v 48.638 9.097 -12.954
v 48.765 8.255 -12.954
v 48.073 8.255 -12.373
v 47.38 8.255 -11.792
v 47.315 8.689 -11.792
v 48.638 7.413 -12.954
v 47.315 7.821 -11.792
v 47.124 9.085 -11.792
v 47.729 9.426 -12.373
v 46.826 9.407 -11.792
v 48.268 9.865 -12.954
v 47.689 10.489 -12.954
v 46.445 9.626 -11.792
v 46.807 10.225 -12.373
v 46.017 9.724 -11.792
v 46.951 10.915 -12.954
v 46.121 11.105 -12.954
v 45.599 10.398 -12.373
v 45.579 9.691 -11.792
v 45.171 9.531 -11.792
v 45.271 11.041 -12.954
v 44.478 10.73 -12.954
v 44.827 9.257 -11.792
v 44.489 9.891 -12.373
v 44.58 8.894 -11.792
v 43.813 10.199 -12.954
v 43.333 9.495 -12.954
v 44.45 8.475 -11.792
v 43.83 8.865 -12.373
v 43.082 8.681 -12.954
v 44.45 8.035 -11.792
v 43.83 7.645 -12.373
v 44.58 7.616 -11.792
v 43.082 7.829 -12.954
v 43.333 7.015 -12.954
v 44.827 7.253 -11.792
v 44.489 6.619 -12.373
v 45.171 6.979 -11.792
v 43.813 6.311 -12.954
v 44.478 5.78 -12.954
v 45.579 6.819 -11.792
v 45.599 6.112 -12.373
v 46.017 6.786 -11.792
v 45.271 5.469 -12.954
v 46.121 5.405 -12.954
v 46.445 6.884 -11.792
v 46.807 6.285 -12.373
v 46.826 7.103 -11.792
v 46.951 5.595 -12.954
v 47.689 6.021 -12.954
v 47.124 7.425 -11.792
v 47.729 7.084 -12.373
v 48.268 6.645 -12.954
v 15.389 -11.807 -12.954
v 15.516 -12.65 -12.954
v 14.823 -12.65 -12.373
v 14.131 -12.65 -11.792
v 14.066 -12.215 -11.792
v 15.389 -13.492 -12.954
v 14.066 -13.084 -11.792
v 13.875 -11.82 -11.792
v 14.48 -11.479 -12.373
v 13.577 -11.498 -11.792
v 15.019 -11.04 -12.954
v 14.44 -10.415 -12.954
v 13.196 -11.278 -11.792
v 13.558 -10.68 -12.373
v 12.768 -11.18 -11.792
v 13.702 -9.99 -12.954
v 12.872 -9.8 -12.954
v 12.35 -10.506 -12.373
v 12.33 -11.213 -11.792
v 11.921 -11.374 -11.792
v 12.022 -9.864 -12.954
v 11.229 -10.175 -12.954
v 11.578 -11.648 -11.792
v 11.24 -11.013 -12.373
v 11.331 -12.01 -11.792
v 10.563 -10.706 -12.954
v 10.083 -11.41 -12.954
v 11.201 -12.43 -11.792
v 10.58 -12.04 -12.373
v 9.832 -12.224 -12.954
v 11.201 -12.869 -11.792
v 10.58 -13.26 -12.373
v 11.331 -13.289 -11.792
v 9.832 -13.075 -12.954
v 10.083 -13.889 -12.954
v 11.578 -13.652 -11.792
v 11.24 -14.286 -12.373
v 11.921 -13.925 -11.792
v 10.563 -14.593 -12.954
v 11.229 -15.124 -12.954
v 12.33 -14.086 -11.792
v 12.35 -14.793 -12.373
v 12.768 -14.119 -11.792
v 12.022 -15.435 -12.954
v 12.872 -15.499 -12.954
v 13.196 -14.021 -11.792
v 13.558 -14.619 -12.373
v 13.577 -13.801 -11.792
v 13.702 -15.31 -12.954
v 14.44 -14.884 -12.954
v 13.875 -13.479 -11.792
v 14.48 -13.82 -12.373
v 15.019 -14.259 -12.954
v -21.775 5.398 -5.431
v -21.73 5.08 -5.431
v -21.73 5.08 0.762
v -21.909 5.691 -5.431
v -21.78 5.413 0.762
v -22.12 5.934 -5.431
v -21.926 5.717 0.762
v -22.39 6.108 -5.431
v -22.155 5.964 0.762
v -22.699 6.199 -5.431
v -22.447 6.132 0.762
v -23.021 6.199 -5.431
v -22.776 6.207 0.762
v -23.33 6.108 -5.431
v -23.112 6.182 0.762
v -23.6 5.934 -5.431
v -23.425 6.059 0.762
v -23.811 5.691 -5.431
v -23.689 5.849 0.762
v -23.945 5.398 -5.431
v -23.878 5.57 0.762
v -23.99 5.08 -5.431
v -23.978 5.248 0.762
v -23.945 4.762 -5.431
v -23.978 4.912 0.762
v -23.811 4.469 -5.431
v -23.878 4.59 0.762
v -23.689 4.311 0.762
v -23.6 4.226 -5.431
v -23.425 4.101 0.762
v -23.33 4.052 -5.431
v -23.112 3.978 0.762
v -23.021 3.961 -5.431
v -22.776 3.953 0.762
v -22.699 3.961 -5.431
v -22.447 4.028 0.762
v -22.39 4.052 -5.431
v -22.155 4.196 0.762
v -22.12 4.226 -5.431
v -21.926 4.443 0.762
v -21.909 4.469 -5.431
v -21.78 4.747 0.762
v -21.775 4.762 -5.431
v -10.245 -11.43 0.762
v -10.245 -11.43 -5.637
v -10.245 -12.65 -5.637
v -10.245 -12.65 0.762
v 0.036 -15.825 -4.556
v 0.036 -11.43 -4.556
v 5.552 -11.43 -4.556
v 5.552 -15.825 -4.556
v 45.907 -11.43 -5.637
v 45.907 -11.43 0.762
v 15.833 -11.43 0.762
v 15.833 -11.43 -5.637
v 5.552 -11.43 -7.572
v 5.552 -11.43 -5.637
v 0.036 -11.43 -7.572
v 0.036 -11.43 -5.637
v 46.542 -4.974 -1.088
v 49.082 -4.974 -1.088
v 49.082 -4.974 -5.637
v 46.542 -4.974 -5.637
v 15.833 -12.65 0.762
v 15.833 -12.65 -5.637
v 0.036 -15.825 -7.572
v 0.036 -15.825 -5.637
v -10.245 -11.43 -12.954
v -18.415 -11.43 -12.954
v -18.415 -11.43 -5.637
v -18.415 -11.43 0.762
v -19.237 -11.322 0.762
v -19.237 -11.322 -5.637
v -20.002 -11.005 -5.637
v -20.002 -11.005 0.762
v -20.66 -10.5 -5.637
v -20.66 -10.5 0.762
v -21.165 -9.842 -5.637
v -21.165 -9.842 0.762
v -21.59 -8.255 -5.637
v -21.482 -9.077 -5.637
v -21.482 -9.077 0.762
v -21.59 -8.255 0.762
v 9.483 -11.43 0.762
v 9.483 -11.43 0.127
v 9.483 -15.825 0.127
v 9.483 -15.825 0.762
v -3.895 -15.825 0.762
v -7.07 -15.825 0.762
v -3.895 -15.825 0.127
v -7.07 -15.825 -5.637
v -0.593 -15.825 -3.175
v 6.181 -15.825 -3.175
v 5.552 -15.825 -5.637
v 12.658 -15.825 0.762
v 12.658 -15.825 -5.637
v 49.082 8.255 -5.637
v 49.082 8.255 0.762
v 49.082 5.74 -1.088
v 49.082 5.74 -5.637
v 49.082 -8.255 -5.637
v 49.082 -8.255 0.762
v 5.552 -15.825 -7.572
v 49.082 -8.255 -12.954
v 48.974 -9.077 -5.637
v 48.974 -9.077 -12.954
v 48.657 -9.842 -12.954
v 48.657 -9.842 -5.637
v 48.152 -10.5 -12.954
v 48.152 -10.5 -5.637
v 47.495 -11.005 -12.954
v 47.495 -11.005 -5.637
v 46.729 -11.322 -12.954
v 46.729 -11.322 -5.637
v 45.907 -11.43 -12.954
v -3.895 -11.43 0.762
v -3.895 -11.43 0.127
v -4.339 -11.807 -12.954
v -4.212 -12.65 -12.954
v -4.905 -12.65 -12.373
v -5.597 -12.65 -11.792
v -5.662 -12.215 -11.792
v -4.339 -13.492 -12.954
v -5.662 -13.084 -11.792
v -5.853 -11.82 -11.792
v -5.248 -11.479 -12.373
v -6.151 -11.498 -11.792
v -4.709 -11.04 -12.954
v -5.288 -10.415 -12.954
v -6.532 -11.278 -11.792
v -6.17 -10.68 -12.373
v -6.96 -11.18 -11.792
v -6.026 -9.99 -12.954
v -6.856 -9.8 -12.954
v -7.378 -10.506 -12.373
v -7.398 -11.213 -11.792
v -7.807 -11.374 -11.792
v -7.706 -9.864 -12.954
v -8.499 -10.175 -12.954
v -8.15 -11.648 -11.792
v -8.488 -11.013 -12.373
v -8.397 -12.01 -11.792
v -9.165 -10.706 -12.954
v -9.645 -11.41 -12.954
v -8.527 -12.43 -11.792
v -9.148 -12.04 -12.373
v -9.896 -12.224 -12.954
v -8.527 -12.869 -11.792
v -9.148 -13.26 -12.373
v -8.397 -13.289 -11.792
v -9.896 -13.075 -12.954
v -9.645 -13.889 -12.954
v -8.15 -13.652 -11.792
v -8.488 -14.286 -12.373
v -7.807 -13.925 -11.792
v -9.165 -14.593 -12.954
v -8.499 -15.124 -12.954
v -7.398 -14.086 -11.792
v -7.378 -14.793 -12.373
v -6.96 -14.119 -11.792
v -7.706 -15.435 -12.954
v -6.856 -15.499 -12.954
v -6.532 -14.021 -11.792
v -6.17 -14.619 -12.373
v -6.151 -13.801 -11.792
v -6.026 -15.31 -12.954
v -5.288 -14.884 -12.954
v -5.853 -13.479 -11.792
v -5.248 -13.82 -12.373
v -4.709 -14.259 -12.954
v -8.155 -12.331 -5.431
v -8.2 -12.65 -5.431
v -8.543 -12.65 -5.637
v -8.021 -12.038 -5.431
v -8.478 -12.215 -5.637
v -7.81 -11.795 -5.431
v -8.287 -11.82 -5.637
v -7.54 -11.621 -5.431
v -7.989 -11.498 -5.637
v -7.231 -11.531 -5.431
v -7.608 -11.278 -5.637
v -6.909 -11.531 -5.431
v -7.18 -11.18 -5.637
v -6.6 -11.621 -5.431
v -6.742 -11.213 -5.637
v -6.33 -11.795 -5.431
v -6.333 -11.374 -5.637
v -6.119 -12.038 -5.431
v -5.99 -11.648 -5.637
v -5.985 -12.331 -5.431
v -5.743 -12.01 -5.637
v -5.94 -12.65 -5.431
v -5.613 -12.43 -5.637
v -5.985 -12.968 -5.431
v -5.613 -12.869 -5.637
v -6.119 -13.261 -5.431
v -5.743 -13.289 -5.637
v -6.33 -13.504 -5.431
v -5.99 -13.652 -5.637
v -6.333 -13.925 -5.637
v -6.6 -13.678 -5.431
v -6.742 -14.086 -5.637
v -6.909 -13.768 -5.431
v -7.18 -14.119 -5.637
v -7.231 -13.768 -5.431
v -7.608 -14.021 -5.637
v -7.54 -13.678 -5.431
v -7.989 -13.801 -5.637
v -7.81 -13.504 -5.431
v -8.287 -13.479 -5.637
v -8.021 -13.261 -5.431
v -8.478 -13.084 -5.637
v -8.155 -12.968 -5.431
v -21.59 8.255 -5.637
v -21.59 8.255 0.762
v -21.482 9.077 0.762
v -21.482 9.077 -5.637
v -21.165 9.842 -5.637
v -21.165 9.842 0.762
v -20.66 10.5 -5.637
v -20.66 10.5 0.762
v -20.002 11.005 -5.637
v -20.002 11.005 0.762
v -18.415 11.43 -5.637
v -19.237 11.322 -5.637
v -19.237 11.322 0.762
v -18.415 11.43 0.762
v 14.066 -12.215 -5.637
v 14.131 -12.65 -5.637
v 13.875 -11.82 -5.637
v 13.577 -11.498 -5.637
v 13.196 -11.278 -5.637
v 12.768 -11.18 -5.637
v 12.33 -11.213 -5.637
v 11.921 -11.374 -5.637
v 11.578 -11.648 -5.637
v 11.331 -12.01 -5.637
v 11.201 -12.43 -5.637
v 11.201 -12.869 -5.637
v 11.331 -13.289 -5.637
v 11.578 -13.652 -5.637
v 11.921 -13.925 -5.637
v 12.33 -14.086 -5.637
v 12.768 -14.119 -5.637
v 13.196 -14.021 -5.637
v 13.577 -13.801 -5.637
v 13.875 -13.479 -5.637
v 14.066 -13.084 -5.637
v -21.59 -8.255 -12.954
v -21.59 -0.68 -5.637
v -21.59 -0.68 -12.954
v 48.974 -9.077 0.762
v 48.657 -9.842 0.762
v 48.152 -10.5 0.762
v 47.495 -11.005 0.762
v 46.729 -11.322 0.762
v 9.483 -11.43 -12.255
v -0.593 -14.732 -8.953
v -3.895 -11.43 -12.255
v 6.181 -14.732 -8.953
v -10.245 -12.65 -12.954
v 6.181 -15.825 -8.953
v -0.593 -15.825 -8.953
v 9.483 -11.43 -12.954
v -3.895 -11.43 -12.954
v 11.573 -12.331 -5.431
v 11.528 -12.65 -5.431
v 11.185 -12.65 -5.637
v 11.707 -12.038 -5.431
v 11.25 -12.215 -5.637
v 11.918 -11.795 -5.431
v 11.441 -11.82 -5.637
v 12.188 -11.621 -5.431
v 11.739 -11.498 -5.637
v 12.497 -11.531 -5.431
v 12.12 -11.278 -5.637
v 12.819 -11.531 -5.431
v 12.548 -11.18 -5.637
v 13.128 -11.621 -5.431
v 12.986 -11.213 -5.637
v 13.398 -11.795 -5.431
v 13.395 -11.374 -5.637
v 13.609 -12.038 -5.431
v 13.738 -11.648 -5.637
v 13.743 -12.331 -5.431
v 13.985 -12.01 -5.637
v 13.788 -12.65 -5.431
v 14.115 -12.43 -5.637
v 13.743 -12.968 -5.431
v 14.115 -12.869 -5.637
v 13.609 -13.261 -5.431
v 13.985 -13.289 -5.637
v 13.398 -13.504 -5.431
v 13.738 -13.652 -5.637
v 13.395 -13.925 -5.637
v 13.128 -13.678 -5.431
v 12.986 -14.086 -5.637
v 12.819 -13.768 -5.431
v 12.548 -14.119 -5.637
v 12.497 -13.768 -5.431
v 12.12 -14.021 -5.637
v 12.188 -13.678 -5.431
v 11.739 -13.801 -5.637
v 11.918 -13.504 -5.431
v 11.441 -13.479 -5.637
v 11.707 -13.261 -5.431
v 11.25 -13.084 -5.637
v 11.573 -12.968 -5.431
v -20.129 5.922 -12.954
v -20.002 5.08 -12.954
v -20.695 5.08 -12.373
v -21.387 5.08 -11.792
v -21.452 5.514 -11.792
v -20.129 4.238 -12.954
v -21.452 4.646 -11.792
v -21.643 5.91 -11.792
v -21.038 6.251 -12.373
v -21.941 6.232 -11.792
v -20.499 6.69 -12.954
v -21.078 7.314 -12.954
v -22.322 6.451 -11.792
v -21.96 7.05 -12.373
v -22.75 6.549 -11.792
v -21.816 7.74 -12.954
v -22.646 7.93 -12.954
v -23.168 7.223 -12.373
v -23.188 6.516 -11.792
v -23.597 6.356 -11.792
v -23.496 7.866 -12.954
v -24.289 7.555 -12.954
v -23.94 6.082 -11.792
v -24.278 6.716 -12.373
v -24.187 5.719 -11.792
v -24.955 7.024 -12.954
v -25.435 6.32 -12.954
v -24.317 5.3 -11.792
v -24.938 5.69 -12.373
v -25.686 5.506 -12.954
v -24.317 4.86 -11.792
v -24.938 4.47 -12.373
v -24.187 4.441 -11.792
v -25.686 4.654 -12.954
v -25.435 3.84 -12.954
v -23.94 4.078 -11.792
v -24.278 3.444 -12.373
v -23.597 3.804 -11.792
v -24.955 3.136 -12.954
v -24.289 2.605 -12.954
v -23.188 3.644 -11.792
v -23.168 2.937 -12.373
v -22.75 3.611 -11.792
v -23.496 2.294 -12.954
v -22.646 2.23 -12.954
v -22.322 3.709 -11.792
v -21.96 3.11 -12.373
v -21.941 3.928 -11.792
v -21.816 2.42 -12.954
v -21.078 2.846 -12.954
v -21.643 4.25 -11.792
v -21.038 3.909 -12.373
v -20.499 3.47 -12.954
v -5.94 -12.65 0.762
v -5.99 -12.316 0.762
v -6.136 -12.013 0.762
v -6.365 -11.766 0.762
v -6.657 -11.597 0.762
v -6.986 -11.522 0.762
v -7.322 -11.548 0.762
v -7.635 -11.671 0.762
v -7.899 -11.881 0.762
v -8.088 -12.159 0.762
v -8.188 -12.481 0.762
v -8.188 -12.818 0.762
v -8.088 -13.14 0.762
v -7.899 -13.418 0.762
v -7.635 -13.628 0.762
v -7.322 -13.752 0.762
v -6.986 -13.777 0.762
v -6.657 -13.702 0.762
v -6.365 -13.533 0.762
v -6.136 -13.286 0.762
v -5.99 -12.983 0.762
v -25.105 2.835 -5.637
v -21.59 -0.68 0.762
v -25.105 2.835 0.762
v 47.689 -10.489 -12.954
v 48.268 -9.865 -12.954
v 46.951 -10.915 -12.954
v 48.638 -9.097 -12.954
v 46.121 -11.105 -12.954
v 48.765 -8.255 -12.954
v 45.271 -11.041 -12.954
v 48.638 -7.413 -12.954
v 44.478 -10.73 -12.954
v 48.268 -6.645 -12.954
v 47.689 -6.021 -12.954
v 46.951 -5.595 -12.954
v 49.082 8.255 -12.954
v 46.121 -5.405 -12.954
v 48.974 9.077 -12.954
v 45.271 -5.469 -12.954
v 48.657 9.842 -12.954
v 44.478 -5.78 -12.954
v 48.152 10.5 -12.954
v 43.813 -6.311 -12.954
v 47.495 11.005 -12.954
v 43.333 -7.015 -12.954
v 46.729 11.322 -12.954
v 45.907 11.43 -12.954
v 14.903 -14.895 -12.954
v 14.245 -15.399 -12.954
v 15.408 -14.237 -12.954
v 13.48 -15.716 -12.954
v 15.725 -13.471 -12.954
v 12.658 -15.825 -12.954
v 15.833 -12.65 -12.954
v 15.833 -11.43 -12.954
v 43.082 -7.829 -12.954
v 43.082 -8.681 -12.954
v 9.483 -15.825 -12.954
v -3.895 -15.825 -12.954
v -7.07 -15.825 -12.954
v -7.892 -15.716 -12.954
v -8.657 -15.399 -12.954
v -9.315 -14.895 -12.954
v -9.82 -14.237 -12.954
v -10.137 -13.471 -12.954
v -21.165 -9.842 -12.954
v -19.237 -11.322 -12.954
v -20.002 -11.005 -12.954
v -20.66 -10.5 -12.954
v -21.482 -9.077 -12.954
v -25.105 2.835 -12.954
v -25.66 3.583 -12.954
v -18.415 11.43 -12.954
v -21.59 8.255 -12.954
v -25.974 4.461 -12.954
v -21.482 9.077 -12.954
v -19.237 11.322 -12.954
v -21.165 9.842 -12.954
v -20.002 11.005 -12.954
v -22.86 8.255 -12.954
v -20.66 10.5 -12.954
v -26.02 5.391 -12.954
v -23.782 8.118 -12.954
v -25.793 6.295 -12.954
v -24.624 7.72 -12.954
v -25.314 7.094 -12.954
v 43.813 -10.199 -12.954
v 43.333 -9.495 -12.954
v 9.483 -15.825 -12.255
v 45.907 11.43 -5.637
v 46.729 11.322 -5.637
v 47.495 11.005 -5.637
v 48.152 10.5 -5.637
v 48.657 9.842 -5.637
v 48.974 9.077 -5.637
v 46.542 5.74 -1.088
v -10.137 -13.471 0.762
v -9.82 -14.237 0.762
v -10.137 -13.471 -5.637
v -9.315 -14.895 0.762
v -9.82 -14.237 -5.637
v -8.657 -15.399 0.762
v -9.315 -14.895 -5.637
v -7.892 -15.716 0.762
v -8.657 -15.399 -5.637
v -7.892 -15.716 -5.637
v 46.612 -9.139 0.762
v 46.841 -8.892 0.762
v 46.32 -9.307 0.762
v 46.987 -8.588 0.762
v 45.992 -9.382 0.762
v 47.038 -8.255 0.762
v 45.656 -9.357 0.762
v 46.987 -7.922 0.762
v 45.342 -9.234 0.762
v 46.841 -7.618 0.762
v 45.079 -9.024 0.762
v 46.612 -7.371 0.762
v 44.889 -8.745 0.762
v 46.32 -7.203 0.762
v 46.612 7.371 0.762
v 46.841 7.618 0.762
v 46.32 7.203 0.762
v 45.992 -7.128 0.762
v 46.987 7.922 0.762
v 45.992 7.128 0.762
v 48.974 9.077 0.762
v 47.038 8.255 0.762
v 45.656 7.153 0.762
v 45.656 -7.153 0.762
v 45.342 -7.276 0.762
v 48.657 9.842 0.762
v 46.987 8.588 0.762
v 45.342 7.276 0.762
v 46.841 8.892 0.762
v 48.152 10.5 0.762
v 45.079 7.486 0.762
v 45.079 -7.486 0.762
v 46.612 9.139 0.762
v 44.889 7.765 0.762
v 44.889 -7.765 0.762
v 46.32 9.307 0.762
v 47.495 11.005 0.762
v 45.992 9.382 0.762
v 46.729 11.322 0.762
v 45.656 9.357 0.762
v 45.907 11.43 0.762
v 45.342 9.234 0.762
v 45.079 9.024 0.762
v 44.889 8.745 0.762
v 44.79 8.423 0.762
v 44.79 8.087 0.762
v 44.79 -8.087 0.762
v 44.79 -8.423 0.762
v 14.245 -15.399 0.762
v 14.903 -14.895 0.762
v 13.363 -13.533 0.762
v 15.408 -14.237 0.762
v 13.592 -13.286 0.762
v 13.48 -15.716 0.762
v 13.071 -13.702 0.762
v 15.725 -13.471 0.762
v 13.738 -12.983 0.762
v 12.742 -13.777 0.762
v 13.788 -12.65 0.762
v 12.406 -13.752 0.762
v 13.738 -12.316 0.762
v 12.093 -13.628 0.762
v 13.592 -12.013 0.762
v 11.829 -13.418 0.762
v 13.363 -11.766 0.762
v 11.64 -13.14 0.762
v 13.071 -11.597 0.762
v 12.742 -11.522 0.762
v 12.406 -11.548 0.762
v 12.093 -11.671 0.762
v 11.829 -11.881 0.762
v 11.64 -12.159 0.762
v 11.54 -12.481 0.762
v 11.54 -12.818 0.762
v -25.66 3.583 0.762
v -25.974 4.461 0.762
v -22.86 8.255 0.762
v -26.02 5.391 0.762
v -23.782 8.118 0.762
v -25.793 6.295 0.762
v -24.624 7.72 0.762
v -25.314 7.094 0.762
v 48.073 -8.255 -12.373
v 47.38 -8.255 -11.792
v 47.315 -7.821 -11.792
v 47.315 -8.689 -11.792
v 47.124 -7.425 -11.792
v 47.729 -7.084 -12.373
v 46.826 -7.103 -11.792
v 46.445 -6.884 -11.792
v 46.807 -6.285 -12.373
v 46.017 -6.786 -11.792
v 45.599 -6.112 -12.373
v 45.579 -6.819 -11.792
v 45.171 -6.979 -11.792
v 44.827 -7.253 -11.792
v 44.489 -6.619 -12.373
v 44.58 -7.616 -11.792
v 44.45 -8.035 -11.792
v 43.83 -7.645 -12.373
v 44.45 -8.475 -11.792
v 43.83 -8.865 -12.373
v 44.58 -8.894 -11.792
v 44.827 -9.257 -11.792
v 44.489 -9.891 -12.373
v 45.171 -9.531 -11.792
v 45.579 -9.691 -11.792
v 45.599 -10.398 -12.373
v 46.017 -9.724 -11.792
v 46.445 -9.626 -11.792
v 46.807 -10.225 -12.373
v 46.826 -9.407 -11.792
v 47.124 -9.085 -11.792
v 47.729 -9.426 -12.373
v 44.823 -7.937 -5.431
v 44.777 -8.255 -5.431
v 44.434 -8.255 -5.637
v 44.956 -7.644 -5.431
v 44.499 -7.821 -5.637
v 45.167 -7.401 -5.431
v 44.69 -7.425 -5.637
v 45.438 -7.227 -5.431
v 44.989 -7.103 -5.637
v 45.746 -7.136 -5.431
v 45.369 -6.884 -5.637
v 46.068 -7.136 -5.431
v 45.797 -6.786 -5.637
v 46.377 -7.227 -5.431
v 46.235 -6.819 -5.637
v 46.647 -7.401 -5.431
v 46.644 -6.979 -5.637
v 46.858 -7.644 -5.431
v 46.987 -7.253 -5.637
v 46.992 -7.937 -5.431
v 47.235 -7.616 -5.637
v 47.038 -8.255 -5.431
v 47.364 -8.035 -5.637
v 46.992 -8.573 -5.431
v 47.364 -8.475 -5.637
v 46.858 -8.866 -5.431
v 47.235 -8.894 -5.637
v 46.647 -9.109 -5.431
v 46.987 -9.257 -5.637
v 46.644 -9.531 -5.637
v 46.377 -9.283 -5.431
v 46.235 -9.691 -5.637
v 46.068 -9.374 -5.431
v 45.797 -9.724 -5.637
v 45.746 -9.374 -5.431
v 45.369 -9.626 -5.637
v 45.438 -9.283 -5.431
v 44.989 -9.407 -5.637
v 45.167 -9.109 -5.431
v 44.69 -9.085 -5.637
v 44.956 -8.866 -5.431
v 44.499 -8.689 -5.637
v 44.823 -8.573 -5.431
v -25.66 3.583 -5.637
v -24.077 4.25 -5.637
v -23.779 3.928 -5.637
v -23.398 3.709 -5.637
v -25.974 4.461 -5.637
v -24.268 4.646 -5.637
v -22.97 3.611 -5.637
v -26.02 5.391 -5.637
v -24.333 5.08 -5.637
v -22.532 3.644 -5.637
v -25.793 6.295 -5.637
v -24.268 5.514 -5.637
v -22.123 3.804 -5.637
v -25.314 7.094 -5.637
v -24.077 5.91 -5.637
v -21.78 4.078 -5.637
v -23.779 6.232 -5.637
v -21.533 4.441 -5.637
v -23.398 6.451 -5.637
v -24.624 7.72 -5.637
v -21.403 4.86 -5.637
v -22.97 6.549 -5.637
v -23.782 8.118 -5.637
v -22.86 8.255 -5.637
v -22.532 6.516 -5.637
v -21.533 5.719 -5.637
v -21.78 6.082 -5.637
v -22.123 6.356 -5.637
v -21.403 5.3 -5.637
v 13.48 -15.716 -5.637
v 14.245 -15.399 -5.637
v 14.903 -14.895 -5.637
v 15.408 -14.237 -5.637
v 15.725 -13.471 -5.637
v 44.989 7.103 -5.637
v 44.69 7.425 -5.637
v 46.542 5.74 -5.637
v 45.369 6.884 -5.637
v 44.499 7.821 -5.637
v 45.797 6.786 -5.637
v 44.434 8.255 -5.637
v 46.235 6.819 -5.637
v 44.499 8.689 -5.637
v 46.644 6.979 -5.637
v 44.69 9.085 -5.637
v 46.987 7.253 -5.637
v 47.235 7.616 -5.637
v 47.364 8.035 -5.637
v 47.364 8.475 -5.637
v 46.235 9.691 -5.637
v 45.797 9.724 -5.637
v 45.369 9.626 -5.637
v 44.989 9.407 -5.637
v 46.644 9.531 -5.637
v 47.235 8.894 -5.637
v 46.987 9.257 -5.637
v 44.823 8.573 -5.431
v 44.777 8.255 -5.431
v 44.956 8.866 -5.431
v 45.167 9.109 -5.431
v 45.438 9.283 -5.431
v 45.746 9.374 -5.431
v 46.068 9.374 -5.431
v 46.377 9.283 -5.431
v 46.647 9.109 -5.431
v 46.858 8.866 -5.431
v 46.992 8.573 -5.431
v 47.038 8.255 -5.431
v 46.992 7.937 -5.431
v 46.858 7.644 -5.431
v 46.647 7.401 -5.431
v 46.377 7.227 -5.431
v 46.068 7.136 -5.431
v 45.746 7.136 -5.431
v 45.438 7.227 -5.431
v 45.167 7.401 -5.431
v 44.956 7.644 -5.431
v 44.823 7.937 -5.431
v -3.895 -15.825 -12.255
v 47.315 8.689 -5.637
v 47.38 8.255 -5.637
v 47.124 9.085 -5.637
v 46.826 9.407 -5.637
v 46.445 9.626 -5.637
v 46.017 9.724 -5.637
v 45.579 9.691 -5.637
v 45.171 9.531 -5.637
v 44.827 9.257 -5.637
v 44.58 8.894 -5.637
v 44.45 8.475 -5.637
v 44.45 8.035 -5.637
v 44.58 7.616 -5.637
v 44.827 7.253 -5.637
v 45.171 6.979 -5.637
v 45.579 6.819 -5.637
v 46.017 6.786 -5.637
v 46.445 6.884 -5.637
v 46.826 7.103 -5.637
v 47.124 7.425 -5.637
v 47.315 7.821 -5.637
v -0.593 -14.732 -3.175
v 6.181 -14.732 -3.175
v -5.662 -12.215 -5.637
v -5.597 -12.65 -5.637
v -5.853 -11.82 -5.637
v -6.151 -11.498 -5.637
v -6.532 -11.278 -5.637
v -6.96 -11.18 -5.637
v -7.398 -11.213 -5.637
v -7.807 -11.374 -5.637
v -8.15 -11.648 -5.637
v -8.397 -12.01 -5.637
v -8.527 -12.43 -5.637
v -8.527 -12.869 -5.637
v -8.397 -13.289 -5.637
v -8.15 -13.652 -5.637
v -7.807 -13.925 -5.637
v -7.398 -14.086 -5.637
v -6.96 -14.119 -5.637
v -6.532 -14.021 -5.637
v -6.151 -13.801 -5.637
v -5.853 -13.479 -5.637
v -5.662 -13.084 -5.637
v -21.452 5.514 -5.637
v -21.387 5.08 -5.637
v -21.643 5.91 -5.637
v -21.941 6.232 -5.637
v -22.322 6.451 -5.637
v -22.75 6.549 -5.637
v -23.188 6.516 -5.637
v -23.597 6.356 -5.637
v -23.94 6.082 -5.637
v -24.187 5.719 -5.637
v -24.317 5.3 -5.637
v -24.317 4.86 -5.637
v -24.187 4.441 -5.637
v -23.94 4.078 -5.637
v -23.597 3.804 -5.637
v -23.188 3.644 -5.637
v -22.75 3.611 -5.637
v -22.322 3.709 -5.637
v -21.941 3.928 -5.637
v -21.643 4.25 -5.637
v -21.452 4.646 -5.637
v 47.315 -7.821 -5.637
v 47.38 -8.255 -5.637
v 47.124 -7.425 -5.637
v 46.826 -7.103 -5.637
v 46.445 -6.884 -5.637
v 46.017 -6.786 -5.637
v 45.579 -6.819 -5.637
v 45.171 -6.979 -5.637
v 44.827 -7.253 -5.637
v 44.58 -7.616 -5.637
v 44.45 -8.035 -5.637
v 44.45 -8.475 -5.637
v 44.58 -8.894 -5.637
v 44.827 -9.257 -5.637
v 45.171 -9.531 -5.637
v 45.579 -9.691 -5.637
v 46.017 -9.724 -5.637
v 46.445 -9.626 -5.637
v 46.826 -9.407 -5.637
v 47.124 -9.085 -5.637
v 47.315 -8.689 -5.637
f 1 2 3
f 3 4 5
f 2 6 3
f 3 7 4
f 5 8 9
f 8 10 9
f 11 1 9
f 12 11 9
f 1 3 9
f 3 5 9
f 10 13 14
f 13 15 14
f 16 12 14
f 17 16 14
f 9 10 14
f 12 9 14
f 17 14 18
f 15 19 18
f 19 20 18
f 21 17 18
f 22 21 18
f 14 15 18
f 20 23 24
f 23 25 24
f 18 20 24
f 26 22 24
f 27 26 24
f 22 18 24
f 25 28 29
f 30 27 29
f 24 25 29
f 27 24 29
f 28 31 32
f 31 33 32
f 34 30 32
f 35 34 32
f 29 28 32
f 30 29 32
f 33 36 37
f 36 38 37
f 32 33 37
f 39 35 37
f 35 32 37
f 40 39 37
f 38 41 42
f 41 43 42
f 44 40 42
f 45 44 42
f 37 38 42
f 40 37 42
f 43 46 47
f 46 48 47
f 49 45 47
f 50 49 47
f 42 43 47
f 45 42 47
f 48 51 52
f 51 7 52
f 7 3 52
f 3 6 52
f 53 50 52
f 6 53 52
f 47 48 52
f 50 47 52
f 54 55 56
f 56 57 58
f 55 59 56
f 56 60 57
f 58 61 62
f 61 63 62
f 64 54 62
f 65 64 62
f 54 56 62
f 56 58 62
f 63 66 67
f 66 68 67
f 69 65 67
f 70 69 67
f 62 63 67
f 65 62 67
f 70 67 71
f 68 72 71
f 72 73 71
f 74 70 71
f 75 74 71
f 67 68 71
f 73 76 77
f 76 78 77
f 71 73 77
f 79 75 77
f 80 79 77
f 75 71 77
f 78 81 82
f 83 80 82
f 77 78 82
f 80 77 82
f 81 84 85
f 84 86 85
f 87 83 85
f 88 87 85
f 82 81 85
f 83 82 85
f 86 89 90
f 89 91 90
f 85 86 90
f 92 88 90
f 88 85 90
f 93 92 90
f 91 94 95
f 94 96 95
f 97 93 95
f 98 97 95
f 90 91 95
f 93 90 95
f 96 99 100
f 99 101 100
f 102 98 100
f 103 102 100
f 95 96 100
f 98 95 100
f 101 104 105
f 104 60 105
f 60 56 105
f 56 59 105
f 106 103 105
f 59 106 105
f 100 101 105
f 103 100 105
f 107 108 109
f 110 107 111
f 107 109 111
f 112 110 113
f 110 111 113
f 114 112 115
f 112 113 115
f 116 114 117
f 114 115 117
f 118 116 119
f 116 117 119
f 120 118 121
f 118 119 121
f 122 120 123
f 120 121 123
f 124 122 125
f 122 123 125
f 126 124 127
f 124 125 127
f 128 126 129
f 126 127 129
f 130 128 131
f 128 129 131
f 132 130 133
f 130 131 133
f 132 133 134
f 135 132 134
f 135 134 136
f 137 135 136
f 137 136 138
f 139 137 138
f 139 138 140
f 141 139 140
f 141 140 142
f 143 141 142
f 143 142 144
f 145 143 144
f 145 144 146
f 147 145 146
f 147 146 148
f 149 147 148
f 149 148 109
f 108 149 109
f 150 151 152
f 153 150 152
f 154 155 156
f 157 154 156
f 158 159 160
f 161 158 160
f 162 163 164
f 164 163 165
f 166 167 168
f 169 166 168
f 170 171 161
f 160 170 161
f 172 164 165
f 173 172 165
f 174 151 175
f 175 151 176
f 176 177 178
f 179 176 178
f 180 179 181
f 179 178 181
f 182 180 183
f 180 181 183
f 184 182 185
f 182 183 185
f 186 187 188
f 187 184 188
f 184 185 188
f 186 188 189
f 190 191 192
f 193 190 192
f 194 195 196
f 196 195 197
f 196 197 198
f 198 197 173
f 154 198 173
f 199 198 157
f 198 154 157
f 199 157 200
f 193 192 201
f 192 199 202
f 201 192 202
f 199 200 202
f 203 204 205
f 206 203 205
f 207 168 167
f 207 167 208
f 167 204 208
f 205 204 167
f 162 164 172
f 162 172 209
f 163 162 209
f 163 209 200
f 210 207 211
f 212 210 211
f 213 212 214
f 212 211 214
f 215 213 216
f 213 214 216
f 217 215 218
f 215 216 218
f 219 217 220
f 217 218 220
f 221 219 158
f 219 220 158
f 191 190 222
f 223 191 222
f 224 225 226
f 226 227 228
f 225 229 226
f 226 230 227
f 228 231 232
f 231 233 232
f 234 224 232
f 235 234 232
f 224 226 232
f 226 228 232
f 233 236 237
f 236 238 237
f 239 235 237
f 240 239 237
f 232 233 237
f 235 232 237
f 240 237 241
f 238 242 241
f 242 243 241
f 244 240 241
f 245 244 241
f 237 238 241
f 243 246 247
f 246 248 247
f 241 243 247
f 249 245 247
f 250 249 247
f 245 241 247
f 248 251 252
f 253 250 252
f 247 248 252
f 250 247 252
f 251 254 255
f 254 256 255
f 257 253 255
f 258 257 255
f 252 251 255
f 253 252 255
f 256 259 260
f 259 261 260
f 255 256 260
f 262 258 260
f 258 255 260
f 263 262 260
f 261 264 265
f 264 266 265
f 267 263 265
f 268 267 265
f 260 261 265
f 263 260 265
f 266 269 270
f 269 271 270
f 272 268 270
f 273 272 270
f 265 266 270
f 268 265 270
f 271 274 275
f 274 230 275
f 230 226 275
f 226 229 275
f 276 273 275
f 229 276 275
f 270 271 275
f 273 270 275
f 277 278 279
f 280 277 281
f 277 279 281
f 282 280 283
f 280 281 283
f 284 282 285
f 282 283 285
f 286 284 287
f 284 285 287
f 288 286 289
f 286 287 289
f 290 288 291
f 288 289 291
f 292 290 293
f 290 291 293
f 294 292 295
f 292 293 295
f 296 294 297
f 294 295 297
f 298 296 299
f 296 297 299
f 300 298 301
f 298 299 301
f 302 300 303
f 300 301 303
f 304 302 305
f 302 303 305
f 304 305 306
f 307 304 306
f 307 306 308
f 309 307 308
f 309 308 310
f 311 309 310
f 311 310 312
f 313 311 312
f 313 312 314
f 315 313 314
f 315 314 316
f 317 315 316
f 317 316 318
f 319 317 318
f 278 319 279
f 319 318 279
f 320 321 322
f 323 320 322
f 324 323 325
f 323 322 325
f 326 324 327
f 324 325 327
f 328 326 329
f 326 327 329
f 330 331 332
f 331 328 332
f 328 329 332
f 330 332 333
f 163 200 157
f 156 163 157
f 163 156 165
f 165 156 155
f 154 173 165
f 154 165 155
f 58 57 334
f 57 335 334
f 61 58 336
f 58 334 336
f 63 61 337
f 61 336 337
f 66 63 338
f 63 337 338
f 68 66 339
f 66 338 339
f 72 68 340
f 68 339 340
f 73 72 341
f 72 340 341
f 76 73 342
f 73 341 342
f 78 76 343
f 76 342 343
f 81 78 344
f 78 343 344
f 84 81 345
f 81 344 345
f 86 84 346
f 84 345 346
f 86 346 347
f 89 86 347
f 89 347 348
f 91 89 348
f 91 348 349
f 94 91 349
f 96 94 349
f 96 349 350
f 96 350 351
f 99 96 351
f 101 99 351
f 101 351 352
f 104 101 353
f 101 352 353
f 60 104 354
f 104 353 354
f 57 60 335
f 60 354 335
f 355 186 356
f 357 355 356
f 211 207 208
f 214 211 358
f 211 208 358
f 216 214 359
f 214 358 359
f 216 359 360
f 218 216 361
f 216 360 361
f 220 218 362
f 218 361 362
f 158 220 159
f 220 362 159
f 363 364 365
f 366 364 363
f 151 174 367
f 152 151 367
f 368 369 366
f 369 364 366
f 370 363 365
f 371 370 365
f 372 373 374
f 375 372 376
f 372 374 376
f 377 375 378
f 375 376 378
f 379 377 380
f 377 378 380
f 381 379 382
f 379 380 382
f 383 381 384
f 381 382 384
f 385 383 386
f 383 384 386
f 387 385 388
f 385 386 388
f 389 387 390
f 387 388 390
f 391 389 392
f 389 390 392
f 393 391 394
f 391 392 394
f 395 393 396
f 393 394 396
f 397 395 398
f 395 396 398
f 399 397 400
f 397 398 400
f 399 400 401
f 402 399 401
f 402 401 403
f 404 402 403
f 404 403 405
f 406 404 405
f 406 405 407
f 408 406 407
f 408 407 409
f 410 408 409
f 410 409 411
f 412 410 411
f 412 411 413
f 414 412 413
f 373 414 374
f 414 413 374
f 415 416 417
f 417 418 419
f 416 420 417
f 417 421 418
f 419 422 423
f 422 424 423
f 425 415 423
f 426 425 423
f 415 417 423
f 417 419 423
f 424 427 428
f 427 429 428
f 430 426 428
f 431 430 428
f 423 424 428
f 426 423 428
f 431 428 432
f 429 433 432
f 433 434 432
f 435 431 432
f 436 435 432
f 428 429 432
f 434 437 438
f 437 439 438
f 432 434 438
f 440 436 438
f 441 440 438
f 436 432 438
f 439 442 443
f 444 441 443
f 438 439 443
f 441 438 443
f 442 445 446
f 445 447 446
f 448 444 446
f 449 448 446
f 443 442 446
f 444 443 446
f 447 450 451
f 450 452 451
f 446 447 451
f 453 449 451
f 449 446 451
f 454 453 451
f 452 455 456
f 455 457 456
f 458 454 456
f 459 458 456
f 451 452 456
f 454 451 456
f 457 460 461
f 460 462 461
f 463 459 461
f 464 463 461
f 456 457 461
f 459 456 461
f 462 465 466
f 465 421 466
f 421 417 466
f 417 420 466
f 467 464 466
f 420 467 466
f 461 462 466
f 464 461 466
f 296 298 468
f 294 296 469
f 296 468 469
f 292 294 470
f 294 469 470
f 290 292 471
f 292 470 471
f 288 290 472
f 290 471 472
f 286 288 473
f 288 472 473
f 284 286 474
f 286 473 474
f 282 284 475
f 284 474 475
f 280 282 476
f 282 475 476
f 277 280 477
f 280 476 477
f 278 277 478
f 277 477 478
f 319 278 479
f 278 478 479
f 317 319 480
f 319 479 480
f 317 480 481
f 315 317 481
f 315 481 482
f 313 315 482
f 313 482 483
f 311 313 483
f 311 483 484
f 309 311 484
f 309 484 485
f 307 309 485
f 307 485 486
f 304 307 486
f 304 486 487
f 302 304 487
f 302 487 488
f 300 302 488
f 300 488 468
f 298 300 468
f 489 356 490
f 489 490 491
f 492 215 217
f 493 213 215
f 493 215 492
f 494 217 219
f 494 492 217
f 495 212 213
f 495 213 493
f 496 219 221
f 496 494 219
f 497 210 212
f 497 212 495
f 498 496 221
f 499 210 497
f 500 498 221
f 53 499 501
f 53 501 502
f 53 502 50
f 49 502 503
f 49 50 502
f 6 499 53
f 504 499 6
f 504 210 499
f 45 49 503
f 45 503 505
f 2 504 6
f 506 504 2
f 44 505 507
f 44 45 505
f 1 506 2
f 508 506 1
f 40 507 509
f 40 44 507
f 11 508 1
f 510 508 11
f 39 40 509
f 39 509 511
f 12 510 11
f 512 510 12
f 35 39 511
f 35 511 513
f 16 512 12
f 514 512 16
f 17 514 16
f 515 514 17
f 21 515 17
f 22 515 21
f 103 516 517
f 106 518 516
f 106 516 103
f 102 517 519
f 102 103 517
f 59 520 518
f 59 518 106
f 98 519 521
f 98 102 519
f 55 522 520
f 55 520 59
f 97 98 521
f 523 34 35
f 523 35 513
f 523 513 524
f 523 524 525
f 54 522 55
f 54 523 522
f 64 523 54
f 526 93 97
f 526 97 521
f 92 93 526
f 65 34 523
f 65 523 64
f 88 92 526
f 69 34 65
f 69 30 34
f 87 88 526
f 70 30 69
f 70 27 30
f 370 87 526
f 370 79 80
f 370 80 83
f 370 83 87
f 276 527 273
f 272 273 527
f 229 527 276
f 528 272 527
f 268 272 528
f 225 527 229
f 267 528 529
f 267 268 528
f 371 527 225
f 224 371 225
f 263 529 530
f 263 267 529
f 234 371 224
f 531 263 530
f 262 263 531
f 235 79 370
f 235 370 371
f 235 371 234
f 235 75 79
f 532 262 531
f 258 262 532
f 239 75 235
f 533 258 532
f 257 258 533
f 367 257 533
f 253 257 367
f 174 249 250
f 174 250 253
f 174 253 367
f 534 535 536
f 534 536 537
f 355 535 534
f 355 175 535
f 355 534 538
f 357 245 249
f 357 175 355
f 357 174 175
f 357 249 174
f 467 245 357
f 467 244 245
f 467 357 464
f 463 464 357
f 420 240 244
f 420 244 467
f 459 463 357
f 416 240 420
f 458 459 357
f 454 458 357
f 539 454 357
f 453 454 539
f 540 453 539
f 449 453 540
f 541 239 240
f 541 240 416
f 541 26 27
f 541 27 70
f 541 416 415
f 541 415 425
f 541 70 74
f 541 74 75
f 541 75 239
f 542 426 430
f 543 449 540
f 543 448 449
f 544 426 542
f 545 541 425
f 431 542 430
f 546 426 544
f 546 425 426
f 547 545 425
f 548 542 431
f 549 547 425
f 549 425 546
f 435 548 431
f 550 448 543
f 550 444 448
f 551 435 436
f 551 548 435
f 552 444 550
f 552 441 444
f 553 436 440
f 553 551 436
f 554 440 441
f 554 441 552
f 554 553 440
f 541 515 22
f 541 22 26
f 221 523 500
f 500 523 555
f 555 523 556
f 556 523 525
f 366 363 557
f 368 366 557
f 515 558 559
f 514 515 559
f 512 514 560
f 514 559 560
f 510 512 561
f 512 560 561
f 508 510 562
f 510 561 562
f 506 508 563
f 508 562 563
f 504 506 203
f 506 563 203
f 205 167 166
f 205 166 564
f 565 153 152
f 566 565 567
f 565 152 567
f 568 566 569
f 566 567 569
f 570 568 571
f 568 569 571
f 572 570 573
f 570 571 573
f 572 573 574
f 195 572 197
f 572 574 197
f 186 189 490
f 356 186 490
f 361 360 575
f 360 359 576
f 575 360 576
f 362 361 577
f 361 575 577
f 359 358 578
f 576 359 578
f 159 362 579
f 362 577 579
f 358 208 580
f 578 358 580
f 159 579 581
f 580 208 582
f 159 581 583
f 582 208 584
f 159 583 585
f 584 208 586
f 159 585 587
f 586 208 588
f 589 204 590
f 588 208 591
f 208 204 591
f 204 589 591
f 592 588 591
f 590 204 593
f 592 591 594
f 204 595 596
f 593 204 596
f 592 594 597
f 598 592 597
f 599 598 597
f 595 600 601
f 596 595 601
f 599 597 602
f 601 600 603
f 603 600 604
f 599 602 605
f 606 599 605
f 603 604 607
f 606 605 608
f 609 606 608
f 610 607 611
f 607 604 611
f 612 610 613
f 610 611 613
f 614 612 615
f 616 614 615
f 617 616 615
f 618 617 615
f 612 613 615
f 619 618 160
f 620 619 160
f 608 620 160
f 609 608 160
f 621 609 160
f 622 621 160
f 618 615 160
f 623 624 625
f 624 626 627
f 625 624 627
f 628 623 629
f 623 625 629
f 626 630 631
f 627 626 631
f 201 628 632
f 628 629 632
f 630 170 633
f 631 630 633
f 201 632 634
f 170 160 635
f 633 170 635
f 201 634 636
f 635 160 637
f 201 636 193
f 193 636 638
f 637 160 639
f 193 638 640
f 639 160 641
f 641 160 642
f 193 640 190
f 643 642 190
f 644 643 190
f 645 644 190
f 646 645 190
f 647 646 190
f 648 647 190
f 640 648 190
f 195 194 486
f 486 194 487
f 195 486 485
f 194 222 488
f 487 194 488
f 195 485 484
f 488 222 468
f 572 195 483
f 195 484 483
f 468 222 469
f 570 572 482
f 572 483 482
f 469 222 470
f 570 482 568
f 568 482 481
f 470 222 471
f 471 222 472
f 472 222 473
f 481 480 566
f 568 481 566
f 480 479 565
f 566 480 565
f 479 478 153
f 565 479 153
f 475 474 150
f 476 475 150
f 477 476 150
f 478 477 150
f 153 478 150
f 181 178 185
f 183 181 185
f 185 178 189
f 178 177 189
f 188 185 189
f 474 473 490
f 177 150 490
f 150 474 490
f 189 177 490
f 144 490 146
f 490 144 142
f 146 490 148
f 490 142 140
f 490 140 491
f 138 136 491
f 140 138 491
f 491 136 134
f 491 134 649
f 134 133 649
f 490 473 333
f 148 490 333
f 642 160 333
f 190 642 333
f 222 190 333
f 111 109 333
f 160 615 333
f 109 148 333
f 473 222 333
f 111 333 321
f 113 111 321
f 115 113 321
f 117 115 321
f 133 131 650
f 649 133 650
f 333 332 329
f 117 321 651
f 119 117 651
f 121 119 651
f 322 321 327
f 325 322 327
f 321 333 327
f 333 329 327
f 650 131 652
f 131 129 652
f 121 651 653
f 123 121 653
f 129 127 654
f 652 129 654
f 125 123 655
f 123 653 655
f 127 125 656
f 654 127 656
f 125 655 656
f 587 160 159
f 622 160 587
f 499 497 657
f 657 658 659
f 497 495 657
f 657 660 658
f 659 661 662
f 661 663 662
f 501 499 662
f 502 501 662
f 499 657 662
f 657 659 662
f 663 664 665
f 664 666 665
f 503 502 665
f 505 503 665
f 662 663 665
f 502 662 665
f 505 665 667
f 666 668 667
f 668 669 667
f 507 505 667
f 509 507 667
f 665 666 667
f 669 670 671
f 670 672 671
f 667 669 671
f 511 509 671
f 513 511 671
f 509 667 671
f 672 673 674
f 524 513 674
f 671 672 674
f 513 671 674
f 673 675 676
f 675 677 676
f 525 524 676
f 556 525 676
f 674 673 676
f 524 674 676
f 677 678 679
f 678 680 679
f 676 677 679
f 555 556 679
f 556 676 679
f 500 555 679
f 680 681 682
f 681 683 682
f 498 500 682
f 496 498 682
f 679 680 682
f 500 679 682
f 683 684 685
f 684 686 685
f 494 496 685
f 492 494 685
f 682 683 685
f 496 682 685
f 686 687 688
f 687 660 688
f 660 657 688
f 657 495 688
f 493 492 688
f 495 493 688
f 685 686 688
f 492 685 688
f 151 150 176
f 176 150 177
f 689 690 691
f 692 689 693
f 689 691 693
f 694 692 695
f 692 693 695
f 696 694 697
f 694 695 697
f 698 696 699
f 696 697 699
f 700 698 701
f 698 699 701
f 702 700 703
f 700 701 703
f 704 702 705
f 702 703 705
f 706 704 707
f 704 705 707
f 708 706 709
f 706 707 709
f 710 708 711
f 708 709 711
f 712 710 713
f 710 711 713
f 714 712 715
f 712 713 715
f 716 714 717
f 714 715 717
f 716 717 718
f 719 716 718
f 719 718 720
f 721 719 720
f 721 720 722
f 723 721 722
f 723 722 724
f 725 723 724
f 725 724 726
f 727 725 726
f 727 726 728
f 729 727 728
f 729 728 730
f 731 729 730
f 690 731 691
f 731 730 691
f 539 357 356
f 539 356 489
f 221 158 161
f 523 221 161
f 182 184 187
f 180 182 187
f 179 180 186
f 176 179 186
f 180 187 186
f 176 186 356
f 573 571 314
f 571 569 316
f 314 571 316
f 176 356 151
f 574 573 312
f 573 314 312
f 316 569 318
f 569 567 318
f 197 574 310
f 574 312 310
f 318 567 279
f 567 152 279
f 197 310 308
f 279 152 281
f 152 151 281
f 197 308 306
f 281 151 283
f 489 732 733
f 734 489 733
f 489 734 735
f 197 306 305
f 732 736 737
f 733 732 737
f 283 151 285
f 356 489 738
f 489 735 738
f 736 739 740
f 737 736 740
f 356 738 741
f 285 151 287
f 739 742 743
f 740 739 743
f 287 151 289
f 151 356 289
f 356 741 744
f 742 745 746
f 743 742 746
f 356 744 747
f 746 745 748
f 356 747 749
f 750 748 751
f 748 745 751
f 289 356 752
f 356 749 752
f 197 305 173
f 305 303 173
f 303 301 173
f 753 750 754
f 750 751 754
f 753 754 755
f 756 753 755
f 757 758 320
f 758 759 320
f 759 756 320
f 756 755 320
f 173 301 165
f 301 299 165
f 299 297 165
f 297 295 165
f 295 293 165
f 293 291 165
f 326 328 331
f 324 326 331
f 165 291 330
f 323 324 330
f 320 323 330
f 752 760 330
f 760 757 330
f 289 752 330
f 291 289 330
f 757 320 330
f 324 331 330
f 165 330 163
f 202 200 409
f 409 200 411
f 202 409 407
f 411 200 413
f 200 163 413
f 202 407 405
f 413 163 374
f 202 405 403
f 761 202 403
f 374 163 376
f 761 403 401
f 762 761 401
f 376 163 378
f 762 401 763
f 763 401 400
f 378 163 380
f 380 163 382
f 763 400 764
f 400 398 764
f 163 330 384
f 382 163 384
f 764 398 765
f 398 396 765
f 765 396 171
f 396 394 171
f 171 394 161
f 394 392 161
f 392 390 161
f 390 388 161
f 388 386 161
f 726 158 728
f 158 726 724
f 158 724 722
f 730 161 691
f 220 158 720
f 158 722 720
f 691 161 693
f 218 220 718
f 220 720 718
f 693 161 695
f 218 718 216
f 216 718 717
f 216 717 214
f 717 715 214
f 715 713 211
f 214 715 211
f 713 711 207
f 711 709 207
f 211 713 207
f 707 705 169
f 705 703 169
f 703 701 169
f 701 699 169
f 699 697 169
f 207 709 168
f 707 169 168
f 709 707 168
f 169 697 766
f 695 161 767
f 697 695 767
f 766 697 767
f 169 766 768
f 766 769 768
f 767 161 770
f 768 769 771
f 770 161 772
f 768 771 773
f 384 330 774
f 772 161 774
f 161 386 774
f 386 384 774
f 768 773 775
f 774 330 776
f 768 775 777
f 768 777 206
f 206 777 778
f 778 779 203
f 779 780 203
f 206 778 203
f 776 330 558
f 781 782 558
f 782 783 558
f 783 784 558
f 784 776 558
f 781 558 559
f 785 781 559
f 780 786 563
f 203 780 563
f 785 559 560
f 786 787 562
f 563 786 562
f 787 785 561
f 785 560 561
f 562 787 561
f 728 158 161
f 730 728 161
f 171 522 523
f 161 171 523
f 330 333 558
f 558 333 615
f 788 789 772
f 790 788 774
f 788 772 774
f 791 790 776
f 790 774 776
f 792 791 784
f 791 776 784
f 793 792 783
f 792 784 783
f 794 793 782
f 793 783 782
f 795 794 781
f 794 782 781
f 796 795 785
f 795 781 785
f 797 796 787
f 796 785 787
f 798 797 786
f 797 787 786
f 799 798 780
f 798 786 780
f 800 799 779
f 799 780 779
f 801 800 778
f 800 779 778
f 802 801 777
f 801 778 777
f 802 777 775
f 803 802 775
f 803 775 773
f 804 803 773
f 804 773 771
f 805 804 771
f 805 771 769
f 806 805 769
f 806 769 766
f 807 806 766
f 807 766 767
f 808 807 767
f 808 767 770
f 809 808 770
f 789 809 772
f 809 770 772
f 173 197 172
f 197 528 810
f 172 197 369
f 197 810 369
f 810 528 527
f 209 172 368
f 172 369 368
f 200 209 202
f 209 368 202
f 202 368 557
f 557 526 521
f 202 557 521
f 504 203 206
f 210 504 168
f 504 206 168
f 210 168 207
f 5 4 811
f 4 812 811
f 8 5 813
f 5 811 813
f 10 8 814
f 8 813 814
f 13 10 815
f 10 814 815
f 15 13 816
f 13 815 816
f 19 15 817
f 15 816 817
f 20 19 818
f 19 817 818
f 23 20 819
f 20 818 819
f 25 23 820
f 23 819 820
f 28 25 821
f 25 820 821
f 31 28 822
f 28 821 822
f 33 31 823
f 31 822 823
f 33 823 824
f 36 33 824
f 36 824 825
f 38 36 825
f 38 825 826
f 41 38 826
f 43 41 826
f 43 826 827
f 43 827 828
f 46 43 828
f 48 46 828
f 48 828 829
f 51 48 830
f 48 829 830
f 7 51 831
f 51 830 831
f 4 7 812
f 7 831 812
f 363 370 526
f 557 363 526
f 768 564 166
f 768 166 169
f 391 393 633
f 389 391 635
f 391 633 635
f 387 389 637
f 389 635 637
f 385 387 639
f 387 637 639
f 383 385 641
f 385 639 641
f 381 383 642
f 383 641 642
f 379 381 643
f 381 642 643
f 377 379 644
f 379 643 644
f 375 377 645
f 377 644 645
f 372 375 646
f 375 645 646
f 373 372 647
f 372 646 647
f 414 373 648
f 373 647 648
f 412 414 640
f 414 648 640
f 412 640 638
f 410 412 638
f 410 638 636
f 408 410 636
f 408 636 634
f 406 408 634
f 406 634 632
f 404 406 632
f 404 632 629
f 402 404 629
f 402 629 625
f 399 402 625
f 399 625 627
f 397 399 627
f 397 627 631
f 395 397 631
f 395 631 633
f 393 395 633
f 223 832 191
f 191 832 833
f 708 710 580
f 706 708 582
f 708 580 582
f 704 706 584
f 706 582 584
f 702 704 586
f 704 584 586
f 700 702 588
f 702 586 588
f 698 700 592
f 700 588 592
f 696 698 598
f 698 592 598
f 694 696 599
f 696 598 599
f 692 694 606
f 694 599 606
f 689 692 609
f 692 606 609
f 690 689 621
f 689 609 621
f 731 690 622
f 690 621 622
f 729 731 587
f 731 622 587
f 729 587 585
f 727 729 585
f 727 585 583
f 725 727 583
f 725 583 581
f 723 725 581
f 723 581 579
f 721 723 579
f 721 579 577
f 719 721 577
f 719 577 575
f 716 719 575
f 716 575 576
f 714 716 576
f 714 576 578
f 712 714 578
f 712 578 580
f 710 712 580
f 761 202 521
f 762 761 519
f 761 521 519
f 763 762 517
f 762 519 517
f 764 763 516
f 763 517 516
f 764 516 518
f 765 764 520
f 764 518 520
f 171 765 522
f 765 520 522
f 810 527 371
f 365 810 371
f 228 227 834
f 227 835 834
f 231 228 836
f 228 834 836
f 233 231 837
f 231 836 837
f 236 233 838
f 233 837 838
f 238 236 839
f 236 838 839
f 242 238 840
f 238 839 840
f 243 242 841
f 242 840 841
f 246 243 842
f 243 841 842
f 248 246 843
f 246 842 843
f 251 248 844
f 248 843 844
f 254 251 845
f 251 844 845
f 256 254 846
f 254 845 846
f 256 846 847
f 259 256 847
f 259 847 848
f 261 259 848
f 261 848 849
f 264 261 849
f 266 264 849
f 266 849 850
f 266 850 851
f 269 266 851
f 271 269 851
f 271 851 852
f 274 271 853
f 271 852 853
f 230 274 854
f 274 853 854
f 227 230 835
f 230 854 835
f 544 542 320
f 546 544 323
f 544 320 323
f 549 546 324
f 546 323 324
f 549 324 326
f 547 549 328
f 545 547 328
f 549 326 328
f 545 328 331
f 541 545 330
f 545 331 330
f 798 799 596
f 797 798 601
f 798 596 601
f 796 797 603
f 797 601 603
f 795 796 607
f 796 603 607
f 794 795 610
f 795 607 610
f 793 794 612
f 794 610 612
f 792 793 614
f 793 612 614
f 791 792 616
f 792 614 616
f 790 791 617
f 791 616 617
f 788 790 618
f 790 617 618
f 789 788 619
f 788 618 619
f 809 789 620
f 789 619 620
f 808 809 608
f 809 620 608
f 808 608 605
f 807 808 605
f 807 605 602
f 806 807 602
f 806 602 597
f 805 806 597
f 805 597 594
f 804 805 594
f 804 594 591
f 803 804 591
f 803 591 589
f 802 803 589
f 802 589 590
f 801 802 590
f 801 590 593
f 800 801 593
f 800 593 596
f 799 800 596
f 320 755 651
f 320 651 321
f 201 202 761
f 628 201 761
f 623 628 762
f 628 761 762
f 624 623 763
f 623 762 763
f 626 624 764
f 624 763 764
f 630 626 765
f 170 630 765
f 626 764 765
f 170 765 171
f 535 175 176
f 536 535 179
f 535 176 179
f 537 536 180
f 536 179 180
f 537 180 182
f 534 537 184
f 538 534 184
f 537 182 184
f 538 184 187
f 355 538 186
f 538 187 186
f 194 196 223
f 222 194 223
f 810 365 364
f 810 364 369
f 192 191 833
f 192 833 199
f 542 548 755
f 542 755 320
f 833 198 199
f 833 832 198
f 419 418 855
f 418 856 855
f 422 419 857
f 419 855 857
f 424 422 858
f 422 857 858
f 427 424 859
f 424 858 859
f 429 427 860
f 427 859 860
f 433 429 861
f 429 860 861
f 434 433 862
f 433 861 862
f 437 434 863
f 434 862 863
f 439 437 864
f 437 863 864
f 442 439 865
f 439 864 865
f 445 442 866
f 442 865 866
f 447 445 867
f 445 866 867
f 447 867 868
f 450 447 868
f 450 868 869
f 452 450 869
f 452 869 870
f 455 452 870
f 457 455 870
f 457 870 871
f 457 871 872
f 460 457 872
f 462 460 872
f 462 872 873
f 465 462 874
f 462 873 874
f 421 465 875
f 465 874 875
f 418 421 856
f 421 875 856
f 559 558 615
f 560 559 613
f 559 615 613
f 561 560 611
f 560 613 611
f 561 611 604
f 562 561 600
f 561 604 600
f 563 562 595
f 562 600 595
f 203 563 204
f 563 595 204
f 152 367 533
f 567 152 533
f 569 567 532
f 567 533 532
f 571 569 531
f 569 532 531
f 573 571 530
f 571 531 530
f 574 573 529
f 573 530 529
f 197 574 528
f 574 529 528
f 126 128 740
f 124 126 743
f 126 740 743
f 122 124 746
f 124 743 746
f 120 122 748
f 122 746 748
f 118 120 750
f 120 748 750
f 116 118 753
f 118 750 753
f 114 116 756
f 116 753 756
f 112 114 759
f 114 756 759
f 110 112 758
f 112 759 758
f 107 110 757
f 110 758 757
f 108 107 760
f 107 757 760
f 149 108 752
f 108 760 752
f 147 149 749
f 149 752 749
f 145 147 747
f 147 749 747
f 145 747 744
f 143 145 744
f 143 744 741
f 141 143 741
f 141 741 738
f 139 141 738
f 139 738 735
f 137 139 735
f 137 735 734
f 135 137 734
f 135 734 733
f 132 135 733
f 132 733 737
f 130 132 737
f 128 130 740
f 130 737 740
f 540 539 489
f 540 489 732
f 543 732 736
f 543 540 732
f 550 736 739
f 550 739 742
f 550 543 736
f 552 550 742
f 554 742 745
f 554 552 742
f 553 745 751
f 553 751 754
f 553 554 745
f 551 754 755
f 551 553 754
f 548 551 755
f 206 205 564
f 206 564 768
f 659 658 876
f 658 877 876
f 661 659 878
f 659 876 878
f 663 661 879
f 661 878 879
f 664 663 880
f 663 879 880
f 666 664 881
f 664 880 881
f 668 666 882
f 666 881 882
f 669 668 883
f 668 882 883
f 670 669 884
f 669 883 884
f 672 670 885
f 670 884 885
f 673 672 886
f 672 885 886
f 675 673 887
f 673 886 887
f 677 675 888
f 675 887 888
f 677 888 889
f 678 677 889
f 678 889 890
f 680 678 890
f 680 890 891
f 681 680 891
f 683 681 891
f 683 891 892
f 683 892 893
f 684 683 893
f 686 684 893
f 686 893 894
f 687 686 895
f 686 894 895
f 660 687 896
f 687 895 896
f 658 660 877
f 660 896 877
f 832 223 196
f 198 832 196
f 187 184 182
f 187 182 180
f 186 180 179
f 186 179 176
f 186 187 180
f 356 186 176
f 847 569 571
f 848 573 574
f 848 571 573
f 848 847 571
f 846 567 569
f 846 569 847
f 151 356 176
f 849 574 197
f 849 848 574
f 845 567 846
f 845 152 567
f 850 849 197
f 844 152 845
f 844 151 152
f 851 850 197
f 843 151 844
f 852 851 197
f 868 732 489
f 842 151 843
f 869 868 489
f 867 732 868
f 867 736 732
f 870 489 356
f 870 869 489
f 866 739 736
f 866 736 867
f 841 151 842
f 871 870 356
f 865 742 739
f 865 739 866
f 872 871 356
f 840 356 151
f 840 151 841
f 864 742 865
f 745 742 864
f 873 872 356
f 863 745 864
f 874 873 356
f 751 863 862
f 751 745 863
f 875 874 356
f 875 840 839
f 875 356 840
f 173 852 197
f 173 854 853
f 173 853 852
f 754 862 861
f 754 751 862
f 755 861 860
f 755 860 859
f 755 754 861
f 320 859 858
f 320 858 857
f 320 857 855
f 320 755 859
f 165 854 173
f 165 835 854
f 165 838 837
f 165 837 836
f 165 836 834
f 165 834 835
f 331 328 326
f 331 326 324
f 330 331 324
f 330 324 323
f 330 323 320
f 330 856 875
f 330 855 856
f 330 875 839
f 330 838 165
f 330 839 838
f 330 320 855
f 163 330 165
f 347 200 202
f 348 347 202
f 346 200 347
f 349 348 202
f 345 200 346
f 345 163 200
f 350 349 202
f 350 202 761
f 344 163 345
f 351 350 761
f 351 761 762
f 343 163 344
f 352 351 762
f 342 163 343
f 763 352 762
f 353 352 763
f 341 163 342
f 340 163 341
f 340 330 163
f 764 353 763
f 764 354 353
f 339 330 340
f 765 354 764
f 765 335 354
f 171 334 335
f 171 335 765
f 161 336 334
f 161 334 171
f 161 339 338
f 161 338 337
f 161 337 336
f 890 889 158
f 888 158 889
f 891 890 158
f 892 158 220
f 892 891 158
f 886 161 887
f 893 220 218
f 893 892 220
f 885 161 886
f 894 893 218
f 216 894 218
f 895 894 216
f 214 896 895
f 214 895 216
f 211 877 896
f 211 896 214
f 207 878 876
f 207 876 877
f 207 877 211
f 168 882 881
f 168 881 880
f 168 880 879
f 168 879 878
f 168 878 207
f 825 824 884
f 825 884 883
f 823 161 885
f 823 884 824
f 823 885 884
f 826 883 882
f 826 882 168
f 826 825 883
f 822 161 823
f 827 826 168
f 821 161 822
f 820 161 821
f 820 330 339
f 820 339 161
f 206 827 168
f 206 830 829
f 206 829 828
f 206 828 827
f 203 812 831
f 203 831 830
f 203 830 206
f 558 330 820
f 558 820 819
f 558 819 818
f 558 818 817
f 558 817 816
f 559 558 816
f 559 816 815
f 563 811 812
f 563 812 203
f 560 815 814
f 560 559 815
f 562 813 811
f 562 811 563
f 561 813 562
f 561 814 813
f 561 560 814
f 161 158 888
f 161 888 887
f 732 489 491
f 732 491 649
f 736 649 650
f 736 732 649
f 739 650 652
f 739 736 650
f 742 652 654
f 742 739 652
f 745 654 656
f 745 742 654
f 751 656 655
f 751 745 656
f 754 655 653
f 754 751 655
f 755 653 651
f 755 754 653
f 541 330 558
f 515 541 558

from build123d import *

# Parameters (mm, degrees)
BOSS_EXTRUDE1_START                               = 0.762
BOSS_EXTRUDE1_DEPTH                               = 13.716
SKETCH2_W                                         = 4.549322437
SKETCH2_H                                         = 10.713432518
CUT_EXTRUDE1_DEPTH                                = 2.54
SKETCH3_W                                         = 13.378
SKETCH3_H                                         = 5.778
SKETCH3_W_2                                       = 5.516
SKETCH3_H_2                                       = 3.016
BOSS_EXTRUDE2_DEPTH                               = 4.39457265
BOSS_EXTRUDE3_DEPTH                               = 13.716
CSK_FOR_4_FLAT_HEAD_MACHINE_SCREW_100_D           = 2.9464
CSK_FOR_4_FLAT_HEAD_MACHINE_SCREW_100_DEPTH       = 7.316622713
CSK_FOR_4_FLAT_HEAD_MACHINE_SCREW_100_CSINK_D     = 5.715
CSK_FOR_4_FLAT_HEAD_MACHINE_SCREW_100_CSINK_ANGLE = 100
CSK_FOR_4_FLAT_HEAD_MACHINE_SCREW_100_TIP         = 0.885187864
TAP_DRILL_FOR_4_40_TAP1_D                         = 2.2606
CHAMFER2_SIZE                                     = 3.302


# Read off the part's stored shape, not the designer's step: Split1
with BuildPart() as part:
    # Sketch1 → Boss-Extrude1 (new body)
    with BuildSketch(Plane.XY.offset(BOSS_EXTRUDE1_START)):
        with BuildLine():
            Line((-18.415, 11.43), (45.907212097, 11.43))
            ThreePointArc((45.907212097, 11.43), (48.152276127, 10.50006403), (49.082212097, 8.255))
            Line((49.082212097, 8.255), (49.082212097, -8.255))
            ThreePointArc((49.082212097, -8.255), (48.152276127, -10.50006403), (45.907212097, -11.43))
            Line((45.907212097, -11.43), (-18.415, -11.43))
            ThreePointArc((-18.415, -11.43), (-20.66006403, -10.50006403), (-21.59, -8.255))
            Line((-21.59, -8.255), (-21.59, 8.255))
            ThreePointArc((-21.59, 8.255), (-20.66006403, 10.50006403), (-18.415, 11.43))
        make_face()
    extrude(amount=-BOSS_EXTRUDE1_DEPTH)

    # Sketch2 → Cut-Extrude1 (cut)
    with BuildSketch(Plane(origin=(49.082212097, 0, 0), x_dir=(0, 0, -1), z_dir=(1, 0, 0))):
        with Locations((3.362716069, 0.383061409)):
            Rectangle(SKETCH2_W, SKETCH2_H)
    extrude(amount=-CUT_EXTRUDE1_DEPTH, mode=Mode.SUBTRACT)

    # Sketch3 → Boss-Extrude2 (add)
    with BuildSketch(Plane.XZ.offset(11.43)):
        with Locations((2.794, -6.064)):
            Rectangle(SKETCH3_W, SKETCH3_H)
        with Locations((2.794, -6.064)):
            Rectangle(SKETCH3_W_2, SKETCH3_H_2, mode=Mode.SUBTRACT)
    extrude(amount=BOSS_EXTRUDE2_DEPTH)

    # Sketch6 → Boss-Extrude3 (add, through all)
    with BuildSketch(Plane(origin=(0, 0, -12.954), x_dir=(-1, 0, 0), z_dir=(0, 0, -1))):
        with BuildLine():
            Line((22.86, 8.255), (21.59, 8.255))
            Line((21.59, 8.255), (21.59, 1.905))
            Line((21.59, 1.905), (21.59, -0.680128061))
            Line((21.59, -0.680128061), (25.10506403, 2.83493597))
            ThreePointArc((25.10506403, 2.83493597), (25.793317516, 6.295019898), (22.86, 8.255))
        make_face()
        with BuildLine():
            Line((7.07, -15.82457265), (3.895, -15.82457265))
            Line((3.895, -15.82457265), (3.895, -11.43))
            Line((3.895, -11.43), (10.245, -11.43))
            Line((10.245, -11.43), (10.245, -12.64957265))
            ThreePointArc((10.245, -12.64957265), (9.31506403, -14.89463668), (7.07, -15.82457265))
        make_face()
        with BuildLine():
            Line((-9.483, -11.43), (-9.483, -15.82457265))
            Line((-9.483, -15.82457265), (-12.658, -15.82457265))
            ThreePointArc((-12.658, -15.82457265), (-14.90306403, -14.89463668), (-15.833, -12.64957265))
            Line((-15.833, -12.64957265), (-15.833, -11.43))
            Line((-15.833, -11.43), (-9.483, -11.43))
        make_face()
    extrude(amount=-BOSS_EXTRUDE3_DEPTH)

    # CSK for #4 Flat Head Machine Screw (100)1
    with Locations(Plane(origin=(0, 0, -12.954), x_dir=(-1, 0, 0), z_dir=(0, 0, -1))):
        with Locations((-45.907212097, -8.255), (-45.907212097, 8.255), (7.07, -12.64957265), (22.86, 5.08), (-12.658, -12.64957265)):
            CounterSinkHole(CSK_FOR_4_FLAT_HEAD_MACHINE_SCREW_100_D / 2, CSK_FOR_4_FLAT_HEAD_MACHINE_SCREW_100_CSINK_D / 2, depth=CSK_FOR_4_FLAT_HEAD_MACHINE_SCREW_100_DEPTH, counter_sink_angle=CSK_FOR_4_FLAT_HEAD_MACHINE_SCREW_100_CSINK_ANGLE)
            with Locations((0, 0, -(CSK_FOR_4_FLAT_HEAD_MACHINE_SCREW_100_DEPTH + CSK_FOR_4_FLAT_HEAD_MACHINE_SCREW_100_TIP / 2))):  # 118° drill point
                Cone(0, CSK_FOR_4_FLAT_HEAD_MACHINE_SCREW_100_D / 2, CSK_FOR_4_FLAT_HEAD_MACHINE_SCREW_100_TIP, mode=Mode.SUBTRACT)

    # Tap Drill for #4-40 Tap1 (through all)
    with Locations(Plane(origin=(0, 0, -5.637377287), x_dir=(-1, 0, 0), z_dir=(0, 0, -1))):
        with Locations((-45.907212097, 8.255), (-45.907212097, -8.255), (22.86, 5.08), (7.07, -12.64957265), (-12.658, -12.64957265)):
            Hole(TAP_DRILL_FOR_4_40_TAP1_D / 2)

    # Chamfer2
    chamfer2_edges = [part.edges().sort_by_distance(p)[0] for p in [
        (9.483, -13.627286325, -8.953),
        (9.483, -13.627286325, -3.175),
        (2.794, -11.43, -3.175),
        (-3.895, -13.627286325, -3.175),
        (-3.895, -13.627286325, -8.953),
        (2.794, -11.43, -8.953),
    ]]
    chamfer(chamfer2_edges, length=CHAMFER2_SIZE)


with BuildPart() as body_2:
    # Split1: the piece on the far side of the plane
    add(part.part)
    split(bisect_by=Plane.XY.offset(-5.637377287), keep=Keep.BOTTOM)


with BuildPart() as part_1:
    add(part.part)

    # Split1
    split(bisect_by=Plane.XY.offset(-5.637377287), keep=Keep.TOP)


solid = Compound([body_2.part, part_1.part])
